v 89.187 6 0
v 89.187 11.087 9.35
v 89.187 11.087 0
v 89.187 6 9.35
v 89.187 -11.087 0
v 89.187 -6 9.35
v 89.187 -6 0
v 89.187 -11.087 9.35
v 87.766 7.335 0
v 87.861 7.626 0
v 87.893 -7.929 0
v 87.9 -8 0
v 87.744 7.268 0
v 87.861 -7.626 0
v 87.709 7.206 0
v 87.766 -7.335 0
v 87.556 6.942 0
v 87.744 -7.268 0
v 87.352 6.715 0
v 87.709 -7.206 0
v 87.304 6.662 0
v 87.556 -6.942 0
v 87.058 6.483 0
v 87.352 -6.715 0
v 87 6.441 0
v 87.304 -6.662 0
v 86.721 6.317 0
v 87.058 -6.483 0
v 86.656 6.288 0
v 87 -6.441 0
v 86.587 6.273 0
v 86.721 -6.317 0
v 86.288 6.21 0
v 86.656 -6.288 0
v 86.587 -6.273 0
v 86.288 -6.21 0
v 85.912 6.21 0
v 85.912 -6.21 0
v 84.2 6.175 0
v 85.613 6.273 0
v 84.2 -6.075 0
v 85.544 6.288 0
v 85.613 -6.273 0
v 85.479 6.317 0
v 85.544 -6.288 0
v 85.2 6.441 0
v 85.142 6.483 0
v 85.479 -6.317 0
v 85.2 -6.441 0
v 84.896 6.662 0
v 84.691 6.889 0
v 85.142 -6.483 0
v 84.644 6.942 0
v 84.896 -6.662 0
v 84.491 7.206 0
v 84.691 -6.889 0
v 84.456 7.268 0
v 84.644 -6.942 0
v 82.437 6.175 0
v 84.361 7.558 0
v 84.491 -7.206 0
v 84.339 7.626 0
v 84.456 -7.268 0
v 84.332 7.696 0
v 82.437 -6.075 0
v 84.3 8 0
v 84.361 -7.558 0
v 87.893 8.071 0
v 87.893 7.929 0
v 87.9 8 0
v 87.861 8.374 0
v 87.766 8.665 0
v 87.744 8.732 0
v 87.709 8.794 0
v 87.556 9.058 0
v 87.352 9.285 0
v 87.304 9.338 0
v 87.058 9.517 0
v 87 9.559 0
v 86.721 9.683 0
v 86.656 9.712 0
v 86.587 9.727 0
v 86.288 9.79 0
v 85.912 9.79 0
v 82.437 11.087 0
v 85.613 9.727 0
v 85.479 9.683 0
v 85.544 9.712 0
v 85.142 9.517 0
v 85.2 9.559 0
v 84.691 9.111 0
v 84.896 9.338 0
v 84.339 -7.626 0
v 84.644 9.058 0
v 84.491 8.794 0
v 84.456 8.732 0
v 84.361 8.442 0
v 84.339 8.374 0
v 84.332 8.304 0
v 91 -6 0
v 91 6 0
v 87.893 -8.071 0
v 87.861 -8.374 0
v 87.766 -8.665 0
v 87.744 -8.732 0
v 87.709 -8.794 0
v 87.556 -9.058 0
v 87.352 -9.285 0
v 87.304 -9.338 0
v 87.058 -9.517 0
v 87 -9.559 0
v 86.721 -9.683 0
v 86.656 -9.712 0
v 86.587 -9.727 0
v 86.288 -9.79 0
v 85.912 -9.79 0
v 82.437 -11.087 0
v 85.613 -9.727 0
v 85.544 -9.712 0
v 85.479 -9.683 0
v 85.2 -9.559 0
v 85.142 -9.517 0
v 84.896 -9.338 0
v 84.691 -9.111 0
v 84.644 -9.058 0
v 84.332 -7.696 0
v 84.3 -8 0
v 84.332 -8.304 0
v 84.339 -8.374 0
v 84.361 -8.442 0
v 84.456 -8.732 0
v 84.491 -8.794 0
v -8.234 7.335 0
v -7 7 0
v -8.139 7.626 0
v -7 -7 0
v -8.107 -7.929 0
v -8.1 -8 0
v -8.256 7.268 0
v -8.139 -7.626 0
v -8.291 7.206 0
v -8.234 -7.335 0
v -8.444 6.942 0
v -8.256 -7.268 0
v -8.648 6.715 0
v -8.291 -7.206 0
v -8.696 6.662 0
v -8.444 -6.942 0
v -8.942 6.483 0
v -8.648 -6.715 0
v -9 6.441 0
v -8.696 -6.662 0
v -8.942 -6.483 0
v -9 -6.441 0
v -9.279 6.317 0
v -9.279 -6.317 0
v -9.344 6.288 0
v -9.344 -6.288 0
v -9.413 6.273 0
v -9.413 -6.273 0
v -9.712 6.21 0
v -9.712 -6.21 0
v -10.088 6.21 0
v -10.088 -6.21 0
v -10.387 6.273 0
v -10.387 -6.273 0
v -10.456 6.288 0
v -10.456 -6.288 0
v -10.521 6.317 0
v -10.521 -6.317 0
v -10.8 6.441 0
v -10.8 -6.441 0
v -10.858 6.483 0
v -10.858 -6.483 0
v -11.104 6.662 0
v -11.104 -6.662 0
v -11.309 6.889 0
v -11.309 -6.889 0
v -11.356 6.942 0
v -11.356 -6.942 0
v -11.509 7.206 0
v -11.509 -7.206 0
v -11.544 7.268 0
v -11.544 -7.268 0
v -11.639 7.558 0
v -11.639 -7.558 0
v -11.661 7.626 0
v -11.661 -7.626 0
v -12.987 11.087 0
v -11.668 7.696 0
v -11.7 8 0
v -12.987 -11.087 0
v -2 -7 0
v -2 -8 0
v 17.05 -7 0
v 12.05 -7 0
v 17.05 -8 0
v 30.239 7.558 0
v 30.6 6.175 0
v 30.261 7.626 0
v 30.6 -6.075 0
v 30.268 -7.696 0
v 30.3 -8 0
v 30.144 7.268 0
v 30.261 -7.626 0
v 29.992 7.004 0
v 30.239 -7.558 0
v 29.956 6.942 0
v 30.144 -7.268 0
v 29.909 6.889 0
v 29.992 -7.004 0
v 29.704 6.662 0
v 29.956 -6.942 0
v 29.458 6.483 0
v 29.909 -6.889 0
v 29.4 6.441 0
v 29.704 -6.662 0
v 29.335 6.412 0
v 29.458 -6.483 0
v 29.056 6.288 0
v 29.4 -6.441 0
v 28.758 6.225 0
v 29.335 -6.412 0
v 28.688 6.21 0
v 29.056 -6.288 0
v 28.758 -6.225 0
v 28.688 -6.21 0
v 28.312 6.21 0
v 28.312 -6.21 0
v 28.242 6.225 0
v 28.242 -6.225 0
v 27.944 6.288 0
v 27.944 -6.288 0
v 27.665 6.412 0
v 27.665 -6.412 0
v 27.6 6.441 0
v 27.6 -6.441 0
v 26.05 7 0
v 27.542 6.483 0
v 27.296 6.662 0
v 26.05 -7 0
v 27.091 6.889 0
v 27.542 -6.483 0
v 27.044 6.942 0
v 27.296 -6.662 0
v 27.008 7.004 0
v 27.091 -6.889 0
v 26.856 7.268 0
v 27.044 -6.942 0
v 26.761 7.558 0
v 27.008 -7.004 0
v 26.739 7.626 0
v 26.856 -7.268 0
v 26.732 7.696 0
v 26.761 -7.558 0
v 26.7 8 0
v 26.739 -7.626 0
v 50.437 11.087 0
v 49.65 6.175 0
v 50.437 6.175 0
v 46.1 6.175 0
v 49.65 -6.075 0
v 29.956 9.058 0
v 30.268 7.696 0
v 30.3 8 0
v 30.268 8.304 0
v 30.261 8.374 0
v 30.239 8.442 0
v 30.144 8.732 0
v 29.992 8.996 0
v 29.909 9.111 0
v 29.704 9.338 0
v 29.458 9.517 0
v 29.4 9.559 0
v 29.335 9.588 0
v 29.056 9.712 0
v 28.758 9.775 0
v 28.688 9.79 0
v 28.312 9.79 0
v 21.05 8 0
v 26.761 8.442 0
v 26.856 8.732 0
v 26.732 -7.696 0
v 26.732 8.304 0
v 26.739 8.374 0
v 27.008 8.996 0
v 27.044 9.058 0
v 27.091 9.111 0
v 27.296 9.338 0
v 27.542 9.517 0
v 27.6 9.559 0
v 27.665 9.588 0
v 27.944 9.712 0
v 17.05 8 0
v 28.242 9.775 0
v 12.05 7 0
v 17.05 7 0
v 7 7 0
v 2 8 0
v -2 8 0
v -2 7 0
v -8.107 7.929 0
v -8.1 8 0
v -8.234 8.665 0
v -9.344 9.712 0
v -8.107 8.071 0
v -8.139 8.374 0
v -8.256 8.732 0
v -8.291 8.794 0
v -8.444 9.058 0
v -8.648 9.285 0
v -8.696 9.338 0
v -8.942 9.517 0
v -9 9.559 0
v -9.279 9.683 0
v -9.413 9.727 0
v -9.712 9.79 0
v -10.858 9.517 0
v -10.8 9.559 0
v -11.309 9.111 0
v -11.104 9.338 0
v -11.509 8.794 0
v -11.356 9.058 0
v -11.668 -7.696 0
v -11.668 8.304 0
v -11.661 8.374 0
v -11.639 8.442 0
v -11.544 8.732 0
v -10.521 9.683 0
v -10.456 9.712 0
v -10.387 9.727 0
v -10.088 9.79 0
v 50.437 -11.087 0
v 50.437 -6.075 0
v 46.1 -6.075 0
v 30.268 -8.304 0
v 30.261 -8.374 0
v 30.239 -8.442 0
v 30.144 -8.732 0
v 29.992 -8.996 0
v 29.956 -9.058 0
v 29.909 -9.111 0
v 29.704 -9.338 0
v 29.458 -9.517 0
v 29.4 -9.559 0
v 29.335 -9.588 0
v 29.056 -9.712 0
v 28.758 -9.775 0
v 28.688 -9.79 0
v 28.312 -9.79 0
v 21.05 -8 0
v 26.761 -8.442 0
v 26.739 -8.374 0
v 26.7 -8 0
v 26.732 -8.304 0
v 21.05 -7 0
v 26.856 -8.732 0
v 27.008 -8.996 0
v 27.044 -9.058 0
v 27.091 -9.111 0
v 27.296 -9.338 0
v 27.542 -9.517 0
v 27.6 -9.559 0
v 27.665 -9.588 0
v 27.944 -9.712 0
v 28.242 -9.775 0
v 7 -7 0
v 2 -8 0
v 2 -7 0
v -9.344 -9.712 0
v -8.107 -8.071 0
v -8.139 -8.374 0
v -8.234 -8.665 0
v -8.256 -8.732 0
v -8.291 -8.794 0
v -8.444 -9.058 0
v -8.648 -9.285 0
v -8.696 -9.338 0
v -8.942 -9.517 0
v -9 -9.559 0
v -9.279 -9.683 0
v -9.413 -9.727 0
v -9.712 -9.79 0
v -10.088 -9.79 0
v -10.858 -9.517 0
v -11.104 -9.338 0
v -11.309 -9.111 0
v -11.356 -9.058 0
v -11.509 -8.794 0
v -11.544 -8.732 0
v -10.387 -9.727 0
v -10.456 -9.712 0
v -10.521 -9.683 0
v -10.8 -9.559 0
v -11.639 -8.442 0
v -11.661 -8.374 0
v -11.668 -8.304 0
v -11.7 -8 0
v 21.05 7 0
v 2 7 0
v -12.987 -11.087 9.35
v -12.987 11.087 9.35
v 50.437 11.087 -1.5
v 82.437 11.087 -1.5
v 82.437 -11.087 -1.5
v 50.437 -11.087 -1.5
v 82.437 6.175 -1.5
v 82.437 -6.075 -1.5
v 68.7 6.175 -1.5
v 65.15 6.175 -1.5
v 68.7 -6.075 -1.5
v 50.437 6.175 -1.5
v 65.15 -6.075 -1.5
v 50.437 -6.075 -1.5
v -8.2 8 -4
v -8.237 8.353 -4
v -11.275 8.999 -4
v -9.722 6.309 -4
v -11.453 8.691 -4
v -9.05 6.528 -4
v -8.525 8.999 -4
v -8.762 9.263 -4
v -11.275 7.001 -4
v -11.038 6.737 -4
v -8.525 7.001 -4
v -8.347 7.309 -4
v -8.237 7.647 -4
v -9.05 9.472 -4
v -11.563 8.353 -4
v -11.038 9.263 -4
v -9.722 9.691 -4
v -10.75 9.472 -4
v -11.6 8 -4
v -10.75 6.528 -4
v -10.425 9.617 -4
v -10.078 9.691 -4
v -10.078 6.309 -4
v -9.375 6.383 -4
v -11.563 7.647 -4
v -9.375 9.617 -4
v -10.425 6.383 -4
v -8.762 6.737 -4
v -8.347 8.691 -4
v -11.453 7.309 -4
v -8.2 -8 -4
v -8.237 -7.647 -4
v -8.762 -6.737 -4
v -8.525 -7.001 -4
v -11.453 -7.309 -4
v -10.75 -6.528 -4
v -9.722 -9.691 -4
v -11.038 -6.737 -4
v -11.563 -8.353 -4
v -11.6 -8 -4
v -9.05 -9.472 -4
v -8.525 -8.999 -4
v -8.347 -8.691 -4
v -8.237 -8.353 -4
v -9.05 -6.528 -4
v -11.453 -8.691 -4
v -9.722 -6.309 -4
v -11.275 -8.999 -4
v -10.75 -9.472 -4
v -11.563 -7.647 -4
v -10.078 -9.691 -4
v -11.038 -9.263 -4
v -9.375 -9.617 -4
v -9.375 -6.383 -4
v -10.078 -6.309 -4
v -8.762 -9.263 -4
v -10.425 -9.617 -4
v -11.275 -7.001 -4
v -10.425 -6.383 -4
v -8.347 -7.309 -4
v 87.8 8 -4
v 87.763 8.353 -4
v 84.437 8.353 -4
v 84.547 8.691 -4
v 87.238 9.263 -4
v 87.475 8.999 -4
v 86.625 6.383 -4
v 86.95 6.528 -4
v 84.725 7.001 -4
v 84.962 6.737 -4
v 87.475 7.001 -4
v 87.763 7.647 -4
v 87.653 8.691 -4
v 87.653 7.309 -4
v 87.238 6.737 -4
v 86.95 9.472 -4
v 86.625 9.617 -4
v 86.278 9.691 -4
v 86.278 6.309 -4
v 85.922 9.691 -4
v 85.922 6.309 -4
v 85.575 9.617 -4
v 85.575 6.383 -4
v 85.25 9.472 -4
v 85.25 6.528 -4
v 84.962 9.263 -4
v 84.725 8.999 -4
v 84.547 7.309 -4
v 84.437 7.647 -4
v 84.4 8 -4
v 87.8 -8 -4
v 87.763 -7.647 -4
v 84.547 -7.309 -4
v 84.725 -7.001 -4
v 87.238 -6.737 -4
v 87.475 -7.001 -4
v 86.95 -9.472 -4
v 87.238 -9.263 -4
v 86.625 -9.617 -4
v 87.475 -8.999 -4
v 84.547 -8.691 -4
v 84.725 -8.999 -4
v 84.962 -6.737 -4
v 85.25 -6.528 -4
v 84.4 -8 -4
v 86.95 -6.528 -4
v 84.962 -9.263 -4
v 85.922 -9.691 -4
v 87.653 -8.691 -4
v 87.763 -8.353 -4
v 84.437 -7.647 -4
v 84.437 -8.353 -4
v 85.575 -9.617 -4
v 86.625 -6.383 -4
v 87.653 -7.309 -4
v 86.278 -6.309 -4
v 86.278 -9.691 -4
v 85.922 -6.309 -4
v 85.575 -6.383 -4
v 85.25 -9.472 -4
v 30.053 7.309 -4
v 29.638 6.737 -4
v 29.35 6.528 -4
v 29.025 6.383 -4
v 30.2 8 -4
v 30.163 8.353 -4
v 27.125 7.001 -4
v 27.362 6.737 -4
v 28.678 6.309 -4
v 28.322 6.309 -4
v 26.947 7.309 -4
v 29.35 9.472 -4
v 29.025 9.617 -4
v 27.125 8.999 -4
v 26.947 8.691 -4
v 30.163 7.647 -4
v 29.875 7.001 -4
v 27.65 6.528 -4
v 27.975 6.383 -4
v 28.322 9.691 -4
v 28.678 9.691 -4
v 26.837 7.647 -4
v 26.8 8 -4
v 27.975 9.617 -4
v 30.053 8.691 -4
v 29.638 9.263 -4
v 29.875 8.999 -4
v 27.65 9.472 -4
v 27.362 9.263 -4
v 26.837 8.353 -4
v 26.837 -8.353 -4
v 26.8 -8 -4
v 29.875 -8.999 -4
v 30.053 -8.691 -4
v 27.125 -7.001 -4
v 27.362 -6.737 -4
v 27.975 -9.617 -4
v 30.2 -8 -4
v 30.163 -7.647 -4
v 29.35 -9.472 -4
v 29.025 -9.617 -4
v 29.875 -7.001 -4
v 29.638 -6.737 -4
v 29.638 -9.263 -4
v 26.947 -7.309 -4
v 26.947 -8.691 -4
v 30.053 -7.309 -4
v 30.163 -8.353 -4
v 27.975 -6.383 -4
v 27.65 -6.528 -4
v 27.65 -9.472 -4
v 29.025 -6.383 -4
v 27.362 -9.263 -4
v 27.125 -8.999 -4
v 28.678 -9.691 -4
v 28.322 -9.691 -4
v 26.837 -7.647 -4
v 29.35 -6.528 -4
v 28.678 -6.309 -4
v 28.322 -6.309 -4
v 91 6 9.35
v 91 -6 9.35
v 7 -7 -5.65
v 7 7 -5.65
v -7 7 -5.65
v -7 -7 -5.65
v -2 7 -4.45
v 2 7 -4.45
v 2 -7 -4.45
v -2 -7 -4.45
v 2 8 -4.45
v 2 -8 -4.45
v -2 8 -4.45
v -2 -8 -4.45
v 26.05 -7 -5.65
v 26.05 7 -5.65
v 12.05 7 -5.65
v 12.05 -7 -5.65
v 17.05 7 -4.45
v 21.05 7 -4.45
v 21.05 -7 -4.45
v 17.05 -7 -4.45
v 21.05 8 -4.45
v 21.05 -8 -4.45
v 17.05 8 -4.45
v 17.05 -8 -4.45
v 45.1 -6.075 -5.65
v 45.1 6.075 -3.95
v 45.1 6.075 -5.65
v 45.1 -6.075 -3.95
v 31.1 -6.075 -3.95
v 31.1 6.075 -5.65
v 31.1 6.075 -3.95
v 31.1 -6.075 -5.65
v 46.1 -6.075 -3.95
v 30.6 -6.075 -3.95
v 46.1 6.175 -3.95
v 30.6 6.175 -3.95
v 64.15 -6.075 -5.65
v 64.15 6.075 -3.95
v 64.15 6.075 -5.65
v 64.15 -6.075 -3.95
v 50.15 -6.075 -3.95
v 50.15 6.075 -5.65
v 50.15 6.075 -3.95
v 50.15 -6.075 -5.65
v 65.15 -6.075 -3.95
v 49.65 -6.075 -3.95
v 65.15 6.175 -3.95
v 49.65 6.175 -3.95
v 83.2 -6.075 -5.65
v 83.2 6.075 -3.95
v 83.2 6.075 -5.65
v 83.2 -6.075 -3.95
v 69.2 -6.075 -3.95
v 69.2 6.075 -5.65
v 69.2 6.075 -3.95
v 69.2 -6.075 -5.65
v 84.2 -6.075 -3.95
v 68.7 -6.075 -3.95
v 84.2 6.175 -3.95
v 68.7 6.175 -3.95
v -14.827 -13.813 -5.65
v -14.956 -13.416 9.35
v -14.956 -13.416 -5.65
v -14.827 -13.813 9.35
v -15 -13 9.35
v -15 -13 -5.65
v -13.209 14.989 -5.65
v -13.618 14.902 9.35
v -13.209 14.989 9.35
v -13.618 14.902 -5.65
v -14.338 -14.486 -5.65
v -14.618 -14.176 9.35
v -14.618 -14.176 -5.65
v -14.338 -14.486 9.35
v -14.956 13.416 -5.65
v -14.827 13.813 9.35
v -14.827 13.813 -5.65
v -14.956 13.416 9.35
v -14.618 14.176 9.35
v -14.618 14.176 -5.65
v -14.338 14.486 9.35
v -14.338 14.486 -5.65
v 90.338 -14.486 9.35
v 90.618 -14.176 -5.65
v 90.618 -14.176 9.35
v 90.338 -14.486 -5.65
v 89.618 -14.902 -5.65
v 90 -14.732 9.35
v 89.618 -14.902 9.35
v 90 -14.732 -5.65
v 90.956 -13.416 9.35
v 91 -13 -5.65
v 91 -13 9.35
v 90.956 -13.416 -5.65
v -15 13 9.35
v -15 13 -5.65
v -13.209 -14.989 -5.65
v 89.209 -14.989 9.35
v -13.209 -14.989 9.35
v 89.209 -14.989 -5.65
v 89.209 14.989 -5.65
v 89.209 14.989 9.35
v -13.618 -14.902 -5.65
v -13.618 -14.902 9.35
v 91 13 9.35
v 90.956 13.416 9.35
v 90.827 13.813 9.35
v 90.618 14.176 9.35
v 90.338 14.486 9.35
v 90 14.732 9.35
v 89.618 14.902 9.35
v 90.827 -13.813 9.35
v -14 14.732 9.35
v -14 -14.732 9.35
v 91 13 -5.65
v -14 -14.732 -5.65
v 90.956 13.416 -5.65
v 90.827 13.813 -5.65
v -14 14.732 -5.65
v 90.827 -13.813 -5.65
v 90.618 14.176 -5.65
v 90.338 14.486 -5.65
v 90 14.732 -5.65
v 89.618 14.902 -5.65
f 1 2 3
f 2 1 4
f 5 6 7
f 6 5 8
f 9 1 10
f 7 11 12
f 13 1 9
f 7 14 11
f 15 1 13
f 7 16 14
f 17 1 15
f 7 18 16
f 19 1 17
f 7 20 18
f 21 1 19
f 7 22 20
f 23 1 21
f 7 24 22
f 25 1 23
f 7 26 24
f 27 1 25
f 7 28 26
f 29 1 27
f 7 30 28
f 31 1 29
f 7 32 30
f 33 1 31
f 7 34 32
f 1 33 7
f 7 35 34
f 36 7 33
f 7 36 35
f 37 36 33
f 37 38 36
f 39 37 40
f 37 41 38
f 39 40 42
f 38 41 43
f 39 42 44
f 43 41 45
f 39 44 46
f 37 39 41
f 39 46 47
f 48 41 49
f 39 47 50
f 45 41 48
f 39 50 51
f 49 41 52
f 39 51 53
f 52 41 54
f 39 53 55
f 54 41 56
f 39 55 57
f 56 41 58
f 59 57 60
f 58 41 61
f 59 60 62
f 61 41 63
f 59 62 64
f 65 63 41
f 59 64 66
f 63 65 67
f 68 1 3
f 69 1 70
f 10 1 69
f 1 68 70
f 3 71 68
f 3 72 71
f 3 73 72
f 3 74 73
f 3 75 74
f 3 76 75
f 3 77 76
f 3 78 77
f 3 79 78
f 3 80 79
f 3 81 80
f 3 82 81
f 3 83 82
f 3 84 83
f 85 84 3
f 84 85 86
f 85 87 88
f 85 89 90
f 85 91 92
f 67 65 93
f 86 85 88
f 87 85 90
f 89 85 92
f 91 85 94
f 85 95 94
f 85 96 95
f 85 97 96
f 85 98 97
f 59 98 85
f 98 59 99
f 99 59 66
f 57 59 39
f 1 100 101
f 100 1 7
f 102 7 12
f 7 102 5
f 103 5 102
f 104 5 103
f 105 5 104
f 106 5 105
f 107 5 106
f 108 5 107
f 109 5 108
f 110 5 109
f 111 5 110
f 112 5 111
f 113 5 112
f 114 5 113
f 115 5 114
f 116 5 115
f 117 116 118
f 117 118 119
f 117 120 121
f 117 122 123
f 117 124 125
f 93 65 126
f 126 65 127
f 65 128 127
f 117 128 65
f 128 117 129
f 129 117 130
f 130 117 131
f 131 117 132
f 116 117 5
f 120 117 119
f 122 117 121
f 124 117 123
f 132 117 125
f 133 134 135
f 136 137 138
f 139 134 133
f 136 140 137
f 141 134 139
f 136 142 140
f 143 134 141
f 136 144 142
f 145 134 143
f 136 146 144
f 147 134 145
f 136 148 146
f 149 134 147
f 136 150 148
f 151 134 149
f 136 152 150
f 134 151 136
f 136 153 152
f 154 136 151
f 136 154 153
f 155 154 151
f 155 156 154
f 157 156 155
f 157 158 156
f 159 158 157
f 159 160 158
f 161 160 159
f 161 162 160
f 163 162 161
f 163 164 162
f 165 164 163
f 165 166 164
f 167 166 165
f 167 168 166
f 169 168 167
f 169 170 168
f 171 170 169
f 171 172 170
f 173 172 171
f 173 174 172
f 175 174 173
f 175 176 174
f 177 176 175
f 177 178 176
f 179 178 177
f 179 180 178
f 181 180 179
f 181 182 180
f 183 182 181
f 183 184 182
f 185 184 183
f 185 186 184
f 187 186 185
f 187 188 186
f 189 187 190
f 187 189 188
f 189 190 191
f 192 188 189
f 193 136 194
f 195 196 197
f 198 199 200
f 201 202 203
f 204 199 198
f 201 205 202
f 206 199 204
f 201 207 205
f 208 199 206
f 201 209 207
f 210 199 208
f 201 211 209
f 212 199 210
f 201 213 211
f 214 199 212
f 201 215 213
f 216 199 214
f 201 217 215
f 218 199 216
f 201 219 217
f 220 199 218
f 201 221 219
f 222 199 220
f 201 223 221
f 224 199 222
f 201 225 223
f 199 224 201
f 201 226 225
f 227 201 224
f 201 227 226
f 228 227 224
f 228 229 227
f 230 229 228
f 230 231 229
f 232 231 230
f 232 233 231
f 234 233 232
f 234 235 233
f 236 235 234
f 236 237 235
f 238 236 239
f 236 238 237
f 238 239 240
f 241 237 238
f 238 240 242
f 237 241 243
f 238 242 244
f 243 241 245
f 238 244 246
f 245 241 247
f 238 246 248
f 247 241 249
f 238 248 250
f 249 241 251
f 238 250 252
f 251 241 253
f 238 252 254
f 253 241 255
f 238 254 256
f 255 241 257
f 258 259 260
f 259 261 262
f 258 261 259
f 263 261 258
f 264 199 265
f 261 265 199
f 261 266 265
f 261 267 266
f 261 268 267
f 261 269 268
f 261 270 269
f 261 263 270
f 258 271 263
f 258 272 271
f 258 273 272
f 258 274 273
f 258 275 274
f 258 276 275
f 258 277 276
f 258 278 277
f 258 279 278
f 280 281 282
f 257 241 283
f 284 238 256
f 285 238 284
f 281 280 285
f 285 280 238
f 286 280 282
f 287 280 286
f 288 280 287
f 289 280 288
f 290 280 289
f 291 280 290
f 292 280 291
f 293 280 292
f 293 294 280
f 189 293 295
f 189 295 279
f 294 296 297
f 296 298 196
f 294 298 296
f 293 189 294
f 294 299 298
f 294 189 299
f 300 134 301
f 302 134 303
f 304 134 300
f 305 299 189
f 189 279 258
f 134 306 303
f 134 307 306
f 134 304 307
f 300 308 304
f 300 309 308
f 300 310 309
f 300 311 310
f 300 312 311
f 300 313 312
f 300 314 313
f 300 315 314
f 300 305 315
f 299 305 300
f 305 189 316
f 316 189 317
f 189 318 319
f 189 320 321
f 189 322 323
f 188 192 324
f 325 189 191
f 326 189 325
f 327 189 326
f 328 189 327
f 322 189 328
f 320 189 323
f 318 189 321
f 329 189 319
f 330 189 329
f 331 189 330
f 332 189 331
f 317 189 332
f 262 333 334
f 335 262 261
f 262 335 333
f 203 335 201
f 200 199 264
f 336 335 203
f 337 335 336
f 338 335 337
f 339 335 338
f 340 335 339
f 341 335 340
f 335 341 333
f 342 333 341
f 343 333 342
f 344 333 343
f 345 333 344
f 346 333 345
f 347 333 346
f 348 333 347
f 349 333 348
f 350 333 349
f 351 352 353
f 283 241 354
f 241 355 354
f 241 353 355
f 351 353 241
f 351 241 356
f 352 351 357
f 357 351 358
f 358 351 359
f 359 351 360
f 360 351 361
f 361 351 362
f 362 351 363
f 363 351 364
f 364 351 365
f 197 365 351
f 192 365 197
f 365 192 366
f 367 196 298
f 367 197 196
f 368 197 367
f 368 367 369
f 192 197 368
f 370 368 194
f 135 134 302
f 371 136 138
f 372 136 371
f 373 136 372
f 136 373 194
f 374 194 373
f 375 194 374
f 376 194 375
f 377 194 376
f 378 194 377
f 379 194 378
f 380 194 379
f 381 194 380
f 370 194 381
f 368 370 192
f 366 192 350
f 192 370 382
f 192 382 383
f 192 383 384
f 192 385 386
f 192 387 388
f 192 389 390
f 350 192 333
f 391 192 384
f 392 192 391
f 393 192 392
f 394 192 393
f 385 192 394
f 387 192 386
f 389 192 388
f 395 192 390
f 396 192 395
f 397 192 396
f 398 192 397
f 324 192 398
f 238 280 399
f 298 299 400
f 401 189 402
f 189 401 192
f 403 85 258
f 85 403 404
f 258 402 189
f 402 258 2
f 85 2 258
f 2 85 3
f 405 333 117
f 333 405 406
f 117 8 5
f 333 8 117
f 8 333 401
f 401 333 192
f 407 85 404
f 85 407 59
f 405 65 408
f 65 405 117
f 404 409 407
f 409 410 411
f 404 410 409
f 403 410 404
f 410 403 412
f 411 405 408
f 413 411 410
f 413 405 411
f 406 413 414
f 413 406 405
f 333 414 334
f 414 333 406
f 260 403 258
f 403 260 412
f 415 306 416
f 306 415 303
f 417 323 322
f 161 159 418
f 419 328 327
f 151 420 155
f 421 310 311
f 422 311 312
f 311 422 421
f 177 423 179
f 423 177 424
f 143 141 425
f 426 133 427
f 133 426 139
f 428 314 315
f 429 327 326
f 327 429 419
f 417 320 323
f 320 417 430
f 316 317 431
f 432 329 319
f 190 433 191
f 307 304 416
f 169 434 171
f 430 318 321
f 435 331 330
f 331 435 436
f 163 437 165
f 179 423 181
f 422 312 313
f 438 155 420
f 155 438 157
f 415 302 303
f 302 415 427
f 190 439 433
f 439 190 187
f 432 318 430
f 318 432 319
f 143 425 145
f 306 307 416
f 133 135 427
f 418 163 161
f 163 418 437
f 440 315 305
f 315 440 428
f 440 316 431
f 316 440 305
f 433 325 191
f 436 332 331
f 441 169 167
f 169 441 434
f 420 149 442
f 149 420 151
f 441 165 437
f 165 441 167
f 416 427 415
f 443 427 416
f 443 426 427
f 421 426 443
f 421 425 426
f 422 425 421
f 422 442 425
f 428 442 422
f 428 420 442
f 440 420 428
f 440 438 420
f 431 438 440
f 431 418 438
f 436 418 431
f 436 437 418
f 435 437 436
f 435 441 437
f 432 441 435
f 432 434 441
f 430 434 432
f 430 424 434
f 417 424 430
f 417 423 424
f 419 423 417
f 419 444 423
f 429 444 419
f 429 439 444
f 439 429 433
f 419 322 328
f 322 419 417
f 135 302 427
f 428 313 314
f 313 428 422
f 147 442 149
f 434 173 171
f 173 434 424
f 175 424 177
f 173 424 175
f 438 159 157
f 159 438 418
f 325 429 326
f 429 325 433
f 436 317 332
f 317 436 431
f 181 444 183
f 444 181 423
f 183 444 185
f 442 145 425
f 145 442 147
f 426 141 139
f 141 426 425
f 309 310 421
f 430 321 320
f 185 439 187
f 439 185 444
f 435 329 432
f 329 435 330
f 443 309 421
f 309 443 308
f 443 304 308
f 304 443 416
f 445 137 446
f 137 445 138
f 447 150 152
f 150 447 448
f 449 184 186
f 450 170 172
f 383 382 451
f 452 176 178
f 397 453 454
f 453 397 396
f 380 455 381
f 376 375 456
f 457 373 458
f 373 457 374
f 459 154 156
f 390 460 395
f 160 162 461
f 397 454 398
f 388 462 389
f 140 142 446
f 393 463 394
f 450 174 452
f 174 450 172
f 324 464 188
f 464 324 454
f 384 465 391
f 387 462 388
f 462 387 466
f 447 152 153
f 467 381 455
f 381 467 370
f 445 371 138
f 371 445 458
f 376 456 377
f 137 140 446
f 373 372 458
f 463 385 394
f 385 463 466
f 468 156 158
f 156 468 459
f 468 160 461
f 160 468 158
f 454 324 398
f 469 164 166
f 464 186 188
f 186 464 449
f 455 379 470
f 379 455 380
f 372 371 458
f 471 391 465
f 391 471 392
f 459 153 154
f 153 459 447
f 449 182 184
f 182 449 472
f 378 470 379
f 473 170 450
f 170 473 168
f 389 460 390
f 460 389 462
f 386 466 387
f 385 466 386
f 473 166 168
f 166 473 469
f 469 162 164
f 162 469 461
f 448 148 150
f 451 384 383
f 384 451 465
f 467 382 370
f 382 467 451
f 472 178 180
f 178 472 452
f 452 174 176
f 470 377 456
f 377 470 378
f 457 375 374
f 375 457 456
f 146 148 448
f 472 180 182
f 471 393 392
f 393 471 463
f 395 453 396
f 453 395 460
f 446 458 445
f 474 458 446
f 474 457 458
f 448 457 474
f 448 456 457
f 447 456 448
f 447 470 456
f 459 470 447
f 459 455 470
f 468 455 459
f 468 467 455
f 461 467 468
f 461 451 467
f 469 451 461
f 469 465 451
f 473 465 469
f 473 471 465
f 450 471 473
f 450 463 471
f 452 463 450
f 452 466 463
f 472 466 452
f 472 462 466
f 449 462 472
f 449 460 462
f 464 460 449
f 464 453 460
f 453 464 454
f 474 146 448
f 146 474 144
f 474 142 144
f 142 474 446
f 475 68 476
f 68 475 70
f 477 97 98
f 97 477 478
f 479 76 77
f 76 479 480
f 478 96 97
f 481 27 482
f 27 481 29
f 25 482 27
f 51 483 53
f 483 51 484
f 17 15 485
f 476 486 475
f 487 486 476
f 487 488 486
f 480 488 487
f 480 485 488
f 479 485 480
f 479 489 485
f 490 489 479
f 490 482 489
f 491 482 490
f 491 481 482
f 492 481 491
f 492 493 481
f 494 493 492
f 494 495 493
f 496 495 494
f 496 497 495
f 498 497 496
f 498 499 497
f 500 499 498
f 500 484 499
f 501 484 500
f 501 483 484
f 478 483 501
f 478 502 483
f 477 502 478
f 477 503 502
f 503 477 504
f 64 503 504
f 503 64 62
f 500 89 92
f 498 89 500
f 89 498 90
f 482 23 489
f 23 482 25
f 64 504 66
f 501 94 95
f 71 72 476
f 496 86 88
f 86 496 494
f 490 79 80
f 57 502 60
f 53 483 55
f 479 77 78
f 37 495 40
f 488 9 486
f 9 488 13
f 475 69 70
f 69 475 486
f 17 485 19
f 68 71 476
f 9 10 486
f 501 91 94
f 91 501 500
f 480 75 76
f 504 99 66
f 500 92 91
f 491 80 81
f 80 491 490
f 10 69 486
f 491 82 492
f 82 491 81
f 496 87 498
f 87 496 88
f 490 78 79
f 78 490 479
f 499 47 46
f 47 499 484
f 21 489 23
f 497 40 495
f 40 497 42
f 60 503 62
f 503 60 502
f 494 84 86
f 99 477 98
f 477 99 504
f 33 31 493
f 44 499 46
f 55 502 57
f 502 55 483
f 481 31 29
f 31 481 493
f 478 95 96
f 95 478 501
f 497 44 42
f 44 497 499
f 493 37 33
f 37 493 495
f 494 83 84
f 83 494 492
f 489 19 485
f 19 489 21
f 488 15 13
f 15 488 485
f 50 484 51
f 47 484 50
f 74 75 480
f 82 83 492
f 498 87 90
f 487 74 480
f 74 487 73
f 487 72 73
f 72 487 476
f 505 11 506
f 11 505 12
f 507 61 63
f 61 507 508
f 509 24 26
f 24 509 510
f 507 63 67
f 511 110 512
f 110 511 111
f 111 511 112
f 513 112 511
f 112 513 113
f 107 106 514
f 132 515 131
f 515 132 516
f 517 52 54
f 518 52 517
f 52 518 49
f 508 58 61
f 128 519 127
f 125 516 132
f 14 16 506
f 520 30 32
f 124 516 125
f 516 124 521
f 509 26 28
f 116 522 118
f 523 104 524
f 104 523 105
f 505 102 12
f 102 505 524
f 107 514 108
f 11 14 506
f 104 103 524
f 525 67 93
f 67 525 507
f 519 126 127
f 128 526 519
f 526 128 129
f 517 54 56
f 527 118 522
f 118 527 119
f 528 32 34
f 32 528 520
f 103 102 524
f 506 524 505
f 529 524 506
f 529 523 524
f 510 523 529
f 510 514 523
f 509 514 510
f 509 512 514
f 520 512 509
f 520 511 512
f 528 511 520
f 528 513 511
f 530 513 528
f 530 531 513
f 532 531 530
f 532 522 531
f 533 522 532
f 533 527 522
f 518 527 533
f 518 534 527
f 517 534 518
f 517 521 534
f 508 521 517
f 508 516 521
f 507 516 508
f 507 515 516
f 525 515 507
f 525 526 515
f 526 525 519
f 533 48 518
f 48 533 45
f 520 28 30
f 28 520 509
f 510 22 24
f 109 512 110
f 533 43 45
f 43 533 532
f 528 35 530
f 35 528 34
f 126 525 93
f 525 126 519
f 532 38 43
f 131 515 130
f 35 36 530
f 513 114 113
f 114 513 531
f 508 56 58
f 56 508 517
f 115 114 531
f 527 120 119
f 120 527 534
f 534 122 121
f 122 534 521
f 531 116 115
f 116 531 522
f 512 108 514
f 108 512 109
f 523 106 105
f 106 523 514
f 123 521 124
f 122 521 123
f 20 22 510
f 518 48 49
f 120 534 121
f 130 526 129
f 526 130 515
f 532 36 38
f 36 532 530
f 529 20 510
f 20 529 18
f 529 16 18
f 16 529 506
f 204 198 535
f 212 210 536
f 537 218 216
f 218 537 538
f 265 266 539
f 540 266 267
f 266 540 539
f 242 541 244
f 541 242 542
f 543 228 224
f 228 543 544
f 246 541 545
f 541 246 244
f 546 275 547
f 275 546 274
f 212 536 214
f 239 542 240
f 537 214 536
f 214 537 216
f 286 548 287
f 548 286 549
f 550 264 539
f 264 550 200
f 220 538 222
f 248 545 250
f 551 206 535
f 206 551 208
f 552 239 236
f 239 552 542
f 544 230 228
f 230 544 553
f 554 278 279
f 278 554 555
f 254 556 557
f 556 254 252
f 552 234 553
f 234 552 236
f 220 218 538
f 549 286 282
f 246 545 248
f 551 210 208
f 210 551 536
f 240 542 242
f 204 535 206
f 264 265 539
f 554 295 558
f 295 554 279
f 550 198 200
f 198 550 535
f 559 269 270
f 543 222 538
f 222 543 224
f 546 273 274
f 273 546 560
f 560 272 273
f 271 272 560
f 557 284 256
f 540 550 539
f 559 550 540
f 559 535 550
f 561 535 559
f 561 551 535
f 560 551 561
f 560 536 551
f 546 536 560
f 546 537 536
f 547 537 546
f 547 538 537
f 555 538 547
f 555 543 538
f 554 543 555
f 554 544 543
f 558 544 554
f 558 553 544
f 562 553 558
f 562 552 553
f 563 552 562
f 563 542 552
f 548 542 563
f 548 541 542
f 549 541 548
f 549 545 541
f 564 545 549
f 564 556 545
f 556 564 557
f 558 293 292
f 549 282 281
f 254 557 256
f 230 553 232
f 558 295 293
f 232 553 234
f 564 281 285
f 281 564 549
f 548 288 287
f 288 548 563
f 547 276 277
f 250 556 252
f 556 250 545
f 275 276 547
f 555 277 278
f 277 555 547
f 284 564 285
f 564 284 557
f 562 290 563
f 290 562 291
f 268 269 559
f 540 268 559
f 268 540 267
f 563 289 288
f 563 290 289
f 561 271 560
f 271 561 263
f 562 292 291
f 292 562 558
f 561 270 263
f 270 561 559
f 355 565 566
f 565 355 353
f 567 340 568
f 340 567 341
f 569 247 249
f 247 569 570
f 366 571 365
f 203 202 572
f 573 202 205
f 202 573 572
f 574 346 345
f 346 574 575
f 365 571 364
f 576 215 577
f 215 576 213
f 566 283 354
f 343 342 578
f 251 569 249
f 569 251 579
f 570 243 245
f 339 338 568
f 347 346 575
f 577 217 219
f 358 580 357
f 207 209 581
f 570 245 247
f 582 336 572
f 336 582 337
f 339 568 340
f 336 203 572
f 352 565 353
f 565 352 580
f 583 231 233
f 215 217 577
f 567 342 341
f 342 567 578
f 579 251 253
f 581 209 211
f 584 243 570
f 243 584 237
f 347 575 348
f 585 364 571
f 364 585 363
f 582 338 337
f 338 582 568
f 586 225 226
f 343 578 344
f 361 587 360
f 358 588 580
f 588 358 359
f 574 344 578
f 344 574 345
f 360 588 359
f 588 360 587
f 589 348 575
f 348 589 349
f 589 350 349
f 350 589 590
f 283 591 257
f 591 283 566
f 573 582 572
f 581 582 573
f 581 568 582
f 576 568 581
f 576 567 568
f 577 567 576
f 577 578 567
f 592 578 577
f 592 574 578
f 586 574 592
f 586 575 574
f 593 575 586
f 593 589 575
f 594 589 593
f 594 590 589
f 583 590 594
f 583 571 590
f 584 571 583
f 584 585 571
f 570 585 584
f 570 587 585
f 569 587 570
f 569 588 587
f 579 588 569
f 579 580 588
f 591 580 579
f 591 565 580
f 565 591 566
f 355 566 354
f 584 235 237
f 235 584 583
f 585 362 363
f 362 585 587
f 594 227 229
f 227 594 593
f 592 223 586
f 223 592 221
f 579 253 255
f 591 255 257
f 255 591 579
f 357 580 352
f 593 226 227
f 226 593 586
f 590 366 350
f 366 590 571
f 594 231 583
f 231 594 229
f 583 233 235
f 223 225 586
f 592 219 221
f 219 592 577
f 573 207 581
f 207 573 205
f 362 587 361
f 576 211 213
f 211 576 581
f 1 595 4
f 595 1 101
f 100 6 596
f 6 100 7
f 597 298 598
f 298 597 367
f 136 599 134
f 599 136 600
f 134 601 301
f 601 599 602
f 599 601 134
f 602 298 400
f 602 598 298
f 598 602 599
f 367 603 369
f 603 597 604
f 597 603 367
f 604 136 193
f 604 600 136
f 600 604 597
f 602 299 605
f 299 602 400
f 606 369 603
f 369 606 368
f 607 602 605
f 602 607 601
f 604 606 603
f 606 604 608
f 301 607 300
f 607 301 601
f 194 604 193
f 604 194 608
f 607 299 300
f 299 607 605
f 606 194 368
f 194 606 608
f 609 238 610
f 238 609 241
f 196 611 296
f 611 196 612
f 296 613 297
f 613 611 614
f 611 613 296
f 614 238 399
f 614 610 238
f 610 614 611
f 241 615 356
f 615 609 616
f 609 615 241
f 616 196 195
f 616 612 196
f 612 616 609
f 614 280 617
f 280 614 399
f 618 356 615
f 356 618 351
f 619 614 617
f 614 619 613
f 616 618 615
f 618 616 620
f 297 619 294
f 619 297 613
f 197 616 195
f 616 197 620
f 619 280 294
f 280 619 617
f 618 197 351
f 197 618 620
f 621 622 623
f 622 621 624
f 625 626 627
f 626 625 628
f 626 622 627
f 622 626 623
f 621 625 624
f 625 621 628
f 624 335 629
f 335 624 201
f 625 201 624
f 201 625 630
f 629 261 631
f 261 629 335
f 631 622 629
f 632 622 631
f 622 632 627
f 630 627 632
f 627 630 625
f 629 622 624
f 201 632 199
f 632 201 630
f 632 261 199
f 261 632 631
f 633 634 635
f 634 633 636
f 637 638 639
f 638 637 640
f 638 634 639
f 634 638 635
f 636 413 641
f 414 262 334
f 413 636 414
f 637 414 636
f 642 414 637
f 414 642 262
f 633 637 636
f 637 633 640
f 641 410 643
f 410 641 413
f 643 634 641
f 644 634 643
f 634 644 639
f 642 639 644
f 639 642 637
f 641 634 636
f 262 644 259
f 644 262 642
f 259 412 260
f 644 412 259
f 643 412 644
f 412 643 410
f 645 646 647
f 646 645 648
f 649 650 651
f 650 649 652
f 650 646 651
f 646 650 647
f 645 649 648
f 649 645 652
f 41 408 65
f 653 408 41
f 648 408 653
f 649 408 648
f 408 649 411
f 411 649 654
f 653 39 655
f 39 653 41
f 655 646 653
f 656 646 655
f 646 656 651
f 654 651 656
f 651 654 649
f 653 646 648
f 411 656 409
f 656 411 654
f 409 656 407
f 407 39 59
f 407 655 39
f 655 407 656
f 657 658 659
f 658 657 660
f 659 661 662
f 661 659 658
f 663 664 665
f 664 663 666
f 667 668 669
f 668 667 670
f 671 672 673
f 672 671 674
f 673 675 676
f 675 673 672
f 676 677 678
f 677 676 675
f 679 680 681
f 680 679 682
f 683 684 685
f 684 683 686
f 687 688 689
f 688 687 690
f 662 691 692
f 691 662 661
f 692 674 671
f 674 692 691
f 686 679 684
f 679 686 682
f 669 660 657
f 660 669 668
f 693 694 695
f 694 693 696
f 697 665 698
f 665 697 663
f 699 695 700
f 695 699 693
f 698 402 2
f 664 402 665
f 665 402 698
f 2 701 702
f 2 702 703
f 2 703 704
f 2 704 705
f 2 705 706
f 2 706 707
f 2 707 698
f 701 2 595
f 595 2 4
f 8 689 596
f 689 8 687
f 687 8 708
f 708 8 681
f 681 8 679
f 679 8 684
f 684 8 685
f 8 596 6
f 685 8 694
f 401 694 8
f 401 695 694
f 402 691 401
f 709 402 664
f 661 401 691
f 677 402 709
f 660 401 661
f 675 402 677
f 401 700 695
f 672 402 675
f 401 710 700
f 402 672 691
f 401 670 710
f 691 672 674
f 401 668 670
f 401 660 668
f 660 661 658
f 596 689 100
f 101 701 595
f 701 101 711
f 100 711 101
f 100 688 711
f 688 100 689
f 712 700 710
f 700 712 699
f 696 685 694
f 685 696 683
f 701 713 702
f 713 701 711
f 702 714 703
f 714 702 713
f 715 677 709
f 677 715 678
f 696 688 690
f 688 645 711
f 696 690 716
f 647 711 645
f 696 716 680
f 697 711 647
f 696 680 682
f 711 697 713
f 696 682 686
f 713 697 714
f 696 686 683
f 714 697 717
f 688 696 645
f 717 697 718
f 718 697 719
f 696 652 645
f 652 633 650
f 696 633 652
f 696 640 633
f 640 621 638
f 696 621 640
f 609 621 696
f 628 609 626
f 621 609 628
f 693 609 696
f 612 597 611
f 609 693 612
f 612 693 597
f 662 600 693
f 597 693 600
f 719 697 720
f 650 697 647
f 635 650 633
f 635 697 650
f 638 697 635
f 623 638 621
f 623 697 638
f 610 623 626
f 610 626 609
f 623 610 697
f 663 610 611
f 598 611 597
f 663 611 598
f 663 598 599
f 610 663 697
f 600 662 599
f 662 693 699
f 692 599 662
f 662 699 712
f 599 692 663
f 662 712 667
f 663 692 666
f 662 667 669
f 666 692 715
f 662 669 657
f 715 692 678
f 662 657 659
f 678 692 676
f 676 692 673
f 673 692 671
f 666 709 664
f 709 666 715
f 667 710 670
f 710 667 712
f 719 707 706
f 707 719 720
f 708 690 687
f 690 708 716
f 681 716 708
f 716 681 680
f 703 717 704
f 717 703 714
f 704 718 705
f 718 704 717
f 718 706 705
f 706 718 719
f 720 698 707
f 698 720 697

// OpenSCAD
/* Notes:
 * - my M2 heat set nuts, the shortest ones, are 3.5mm in diameter and 4mm
 *   long.
 * - stock miniMACRO5 shell leaves 5mm from top face to where the PCB hits
 *   the plastic underneath. Mill-max sockets supposedly take up an additional
 *   0.64mm of space above the board.
 * - rotary encoders only need about 12.25mm in the Y.
 */

$fn=30;

// translate([0,0,-5]) import("./orig/miniMACRO5.stl");
enclosure();
// rotate([180,0,0]) translate([0,0,15-5-2]) bottomPlate();

module enclosure() {
   difference() {
      simpleBody(ht=15);
      pcbPlus(ht=20);
      switchHoles();
   }

}

//Thickness of entire plate
plateThickness=4.8;
//Unit square length, from Cherry MX data sheet
lkey=19.05;
//Hole size, from Cherry MX data sheet
holesize=14;
//length, in units, of board
width=15;
//Height, in units, of board
height=1;

//calculated vars

holediff=lkey-holesize;
w=width*lkey;
h=height*lkey;

//
// THINGS TO PRINT
//
module miniHoles() {
   mm5 = [
         //start ROW 0
         [[0,0],1,"s"],
         [[1,0],1,"s"],
         [[2,0],1,"r"],
         [[3,0],1,"r"],
         [[4,0],1,"r"],
         ];

   holematrix(mm5,0,h-lkey);
}

module switchhole(size=1,openable=0,switch=1){
    translate([0,0,-0.1]) union(){
        if (switch) {
           cube([holesize,holesize,plateThickness+0.4+0.65]);
           translate([holesize/2-2,-1,1.3]) cube([4,holesize+2,plateThickness+0.4 - 1.3+0.65]); // for clip to catch
        }
        else /* encoder */ {
           translate([0,(holesize-12.15)/2,0]) {
              cube([holesize, 12.15, plateThickness+0.4]);
              translate([-0.5,0,1.8]) cube([holesize+1.5, 12.25, plateThickness+0.4]);
           }
        }
    }
}

module holematrix(holes,startx,starty){
    for (key = holes){
        translate([startx+lkey*key[0][0], starty-lkey*key[0][1], 0])
        translate([(lkey*key[1]-holesize)/2,(lkey - holesize)/2, 0])
        switchhole(size=key[1],switch=(key[2] == "s" ? 1 : 0));
    }
}

module bottomPlate() {
   ht = 1.5; // was 2.0
   gap = 0.2;
   postHt = 7.0;
   postDia = 5;

   difference() { 
      union() {
         translate([-12.987+gap,-11.087+gap,0])
            cube([12.987+89.187-2*gap,11.087*2-2*gap,ht]);

         translate([-12.987+gap,-11.087+gap,-1*(5-ht)])
            cube([62-gap,11.087*2-2*gap,5-ht+0.1]);

         translate([84.5,-11.087+gap,-1*(postHt-ht)])
            cube([89.187-gap-84.5,11.087*2-2*gap,postHt-ht+0.1]);

         /* posts */
         translate([-9.9,8,-1*(postHt-ht)]) cylinder(d=postDia,h=5.0);
         translate([-9.9,-8,-1*(postHt-ht)]) cylinder(d=postDia,h=5.0);
         // translate([86.1,8,-1*(postHt-ht)]) cylinder(d=postDia,h=5.0);
         // translate([86.1,-8,-1*(postHt-ht)]) cylinder(d=postDia,h=5.0);
         translate([28.5,8,-1*(postHt-ht)]) cylinder(d=postDia,h=5.0);
         translate([28.5,-8,-1*(postHt-ht)]) cylinder(d=postDia,h=5.0);
      }

      /* USB */
      translate([83,-5.5,-20.0]) cube([20,11,25.5]);

      /* reset */
      translate([-12.987+gap+20.0,11.087-5,-5+ht-0.1])
         cube([5,5,10]);
      translate([-12.987+gap+20.0+2.5,11.087-5,-5+ht-0.1])
         cylinder(d=5,h=10);
      translate([-12.987+gap+20.0-2.5,11.087-5-4,-5+ht-0.1])
         cube([10,10,3]);

      /* screw holes (make < -5.2 if needed to fill hole) */
      translate([-9.9,8,-8.3]) cylinder(d=2.25,h=8.0);
      translate([-9.9,8,0]) cylinder(d=4,h=2.1);

      translate([-9.9,-8,-8.3]) cylinder(d=2.25,h=8.0);
      translate([-9.9,-8,0]) cylinder(d=4,h=10);
      translate([86.1,8,-8.3]) cylinder(d=2.25,h=8.0);
      translate([86.1,8,0]) cylinder(d=4,h=10);
      translate([86.1,-8,-8.3]) cylinder(d=2.25,h=8.0);
      translate([86.1,-8,0]) cylinder(d=4,h=10);
   
      /* middle screw holes */
      translate([28.5,8,-8.3]) cylinder(d=2.25,h=8.0);
      translate([28.5,8,0]) cylinder(d=4,h=10);
      translate([28.5,-8,-8.3]) cylinder(d=2.25,h=8.0);
      translate([28.5,-8,0]) cylinder(d=4,h=10);

   }
}

module pcbPlus(ht=1) {
   translate([-12.987,-11.087,0]) cube([12.987+89.187,11.087*2,ht]);

   /* cutout to account for solder points for arduino riser */
   translate([89.187-35-3.75,-11.087,-1.5]) cube([32,11.087*2,ht+1.5]);

   /* screws, heat set inserts */
   translate([-9.9,8,-4]) cylinder(d2=3.65, d1=3.4,h=5);
   translate([-9.9,-8,-4]) cylinder(d2=3.65, d1=3.4,h=5);
   translate([86.1,8,-4]) cylinder(d2=3.65, d1=3.4,h=5);
   translate([86.1,-8,-4]) cylinder(d2=3.65, d1=3.4,h=5);

   /* middle screw/heat set inserts */
   translate([28.5,8,-4]) cylinder(d2=3.65, d1=3.4,h=5);
   translate([28.5,-8,-4]) cylinder(d2=3.65, d1=3.4,h=5);

   /* USB */
   translate([80,-6,0.0]) cube([20,12,10.5]);
}

module simpleBody(ht=10.5) {
   if (0) {
      /* 5.65mm accounts for mill-max sockets */
      translate([0,0,-5.65]) linear_extrude(height=ht)
         polygon(points=[[-16,-14],[-16,14],[92,14],[92,-14]]);
   }
   else {
      translate([0,0,-5.65]) linear_extrude(height=ht)
         hull() {
            translate([-13,-13,0]) circle(r=2);
            translate([-13,13,0]) circle(r=2);
            translate([89,-13,0]) circle(r=2);
            translate([89,13,0]) circle(r=2);
         }
   }
}

module switchHoles() {
   translate([-7.15-2.525+0.15,-7.15-2.525+0.15,-5.65]) miniHoles();
}
